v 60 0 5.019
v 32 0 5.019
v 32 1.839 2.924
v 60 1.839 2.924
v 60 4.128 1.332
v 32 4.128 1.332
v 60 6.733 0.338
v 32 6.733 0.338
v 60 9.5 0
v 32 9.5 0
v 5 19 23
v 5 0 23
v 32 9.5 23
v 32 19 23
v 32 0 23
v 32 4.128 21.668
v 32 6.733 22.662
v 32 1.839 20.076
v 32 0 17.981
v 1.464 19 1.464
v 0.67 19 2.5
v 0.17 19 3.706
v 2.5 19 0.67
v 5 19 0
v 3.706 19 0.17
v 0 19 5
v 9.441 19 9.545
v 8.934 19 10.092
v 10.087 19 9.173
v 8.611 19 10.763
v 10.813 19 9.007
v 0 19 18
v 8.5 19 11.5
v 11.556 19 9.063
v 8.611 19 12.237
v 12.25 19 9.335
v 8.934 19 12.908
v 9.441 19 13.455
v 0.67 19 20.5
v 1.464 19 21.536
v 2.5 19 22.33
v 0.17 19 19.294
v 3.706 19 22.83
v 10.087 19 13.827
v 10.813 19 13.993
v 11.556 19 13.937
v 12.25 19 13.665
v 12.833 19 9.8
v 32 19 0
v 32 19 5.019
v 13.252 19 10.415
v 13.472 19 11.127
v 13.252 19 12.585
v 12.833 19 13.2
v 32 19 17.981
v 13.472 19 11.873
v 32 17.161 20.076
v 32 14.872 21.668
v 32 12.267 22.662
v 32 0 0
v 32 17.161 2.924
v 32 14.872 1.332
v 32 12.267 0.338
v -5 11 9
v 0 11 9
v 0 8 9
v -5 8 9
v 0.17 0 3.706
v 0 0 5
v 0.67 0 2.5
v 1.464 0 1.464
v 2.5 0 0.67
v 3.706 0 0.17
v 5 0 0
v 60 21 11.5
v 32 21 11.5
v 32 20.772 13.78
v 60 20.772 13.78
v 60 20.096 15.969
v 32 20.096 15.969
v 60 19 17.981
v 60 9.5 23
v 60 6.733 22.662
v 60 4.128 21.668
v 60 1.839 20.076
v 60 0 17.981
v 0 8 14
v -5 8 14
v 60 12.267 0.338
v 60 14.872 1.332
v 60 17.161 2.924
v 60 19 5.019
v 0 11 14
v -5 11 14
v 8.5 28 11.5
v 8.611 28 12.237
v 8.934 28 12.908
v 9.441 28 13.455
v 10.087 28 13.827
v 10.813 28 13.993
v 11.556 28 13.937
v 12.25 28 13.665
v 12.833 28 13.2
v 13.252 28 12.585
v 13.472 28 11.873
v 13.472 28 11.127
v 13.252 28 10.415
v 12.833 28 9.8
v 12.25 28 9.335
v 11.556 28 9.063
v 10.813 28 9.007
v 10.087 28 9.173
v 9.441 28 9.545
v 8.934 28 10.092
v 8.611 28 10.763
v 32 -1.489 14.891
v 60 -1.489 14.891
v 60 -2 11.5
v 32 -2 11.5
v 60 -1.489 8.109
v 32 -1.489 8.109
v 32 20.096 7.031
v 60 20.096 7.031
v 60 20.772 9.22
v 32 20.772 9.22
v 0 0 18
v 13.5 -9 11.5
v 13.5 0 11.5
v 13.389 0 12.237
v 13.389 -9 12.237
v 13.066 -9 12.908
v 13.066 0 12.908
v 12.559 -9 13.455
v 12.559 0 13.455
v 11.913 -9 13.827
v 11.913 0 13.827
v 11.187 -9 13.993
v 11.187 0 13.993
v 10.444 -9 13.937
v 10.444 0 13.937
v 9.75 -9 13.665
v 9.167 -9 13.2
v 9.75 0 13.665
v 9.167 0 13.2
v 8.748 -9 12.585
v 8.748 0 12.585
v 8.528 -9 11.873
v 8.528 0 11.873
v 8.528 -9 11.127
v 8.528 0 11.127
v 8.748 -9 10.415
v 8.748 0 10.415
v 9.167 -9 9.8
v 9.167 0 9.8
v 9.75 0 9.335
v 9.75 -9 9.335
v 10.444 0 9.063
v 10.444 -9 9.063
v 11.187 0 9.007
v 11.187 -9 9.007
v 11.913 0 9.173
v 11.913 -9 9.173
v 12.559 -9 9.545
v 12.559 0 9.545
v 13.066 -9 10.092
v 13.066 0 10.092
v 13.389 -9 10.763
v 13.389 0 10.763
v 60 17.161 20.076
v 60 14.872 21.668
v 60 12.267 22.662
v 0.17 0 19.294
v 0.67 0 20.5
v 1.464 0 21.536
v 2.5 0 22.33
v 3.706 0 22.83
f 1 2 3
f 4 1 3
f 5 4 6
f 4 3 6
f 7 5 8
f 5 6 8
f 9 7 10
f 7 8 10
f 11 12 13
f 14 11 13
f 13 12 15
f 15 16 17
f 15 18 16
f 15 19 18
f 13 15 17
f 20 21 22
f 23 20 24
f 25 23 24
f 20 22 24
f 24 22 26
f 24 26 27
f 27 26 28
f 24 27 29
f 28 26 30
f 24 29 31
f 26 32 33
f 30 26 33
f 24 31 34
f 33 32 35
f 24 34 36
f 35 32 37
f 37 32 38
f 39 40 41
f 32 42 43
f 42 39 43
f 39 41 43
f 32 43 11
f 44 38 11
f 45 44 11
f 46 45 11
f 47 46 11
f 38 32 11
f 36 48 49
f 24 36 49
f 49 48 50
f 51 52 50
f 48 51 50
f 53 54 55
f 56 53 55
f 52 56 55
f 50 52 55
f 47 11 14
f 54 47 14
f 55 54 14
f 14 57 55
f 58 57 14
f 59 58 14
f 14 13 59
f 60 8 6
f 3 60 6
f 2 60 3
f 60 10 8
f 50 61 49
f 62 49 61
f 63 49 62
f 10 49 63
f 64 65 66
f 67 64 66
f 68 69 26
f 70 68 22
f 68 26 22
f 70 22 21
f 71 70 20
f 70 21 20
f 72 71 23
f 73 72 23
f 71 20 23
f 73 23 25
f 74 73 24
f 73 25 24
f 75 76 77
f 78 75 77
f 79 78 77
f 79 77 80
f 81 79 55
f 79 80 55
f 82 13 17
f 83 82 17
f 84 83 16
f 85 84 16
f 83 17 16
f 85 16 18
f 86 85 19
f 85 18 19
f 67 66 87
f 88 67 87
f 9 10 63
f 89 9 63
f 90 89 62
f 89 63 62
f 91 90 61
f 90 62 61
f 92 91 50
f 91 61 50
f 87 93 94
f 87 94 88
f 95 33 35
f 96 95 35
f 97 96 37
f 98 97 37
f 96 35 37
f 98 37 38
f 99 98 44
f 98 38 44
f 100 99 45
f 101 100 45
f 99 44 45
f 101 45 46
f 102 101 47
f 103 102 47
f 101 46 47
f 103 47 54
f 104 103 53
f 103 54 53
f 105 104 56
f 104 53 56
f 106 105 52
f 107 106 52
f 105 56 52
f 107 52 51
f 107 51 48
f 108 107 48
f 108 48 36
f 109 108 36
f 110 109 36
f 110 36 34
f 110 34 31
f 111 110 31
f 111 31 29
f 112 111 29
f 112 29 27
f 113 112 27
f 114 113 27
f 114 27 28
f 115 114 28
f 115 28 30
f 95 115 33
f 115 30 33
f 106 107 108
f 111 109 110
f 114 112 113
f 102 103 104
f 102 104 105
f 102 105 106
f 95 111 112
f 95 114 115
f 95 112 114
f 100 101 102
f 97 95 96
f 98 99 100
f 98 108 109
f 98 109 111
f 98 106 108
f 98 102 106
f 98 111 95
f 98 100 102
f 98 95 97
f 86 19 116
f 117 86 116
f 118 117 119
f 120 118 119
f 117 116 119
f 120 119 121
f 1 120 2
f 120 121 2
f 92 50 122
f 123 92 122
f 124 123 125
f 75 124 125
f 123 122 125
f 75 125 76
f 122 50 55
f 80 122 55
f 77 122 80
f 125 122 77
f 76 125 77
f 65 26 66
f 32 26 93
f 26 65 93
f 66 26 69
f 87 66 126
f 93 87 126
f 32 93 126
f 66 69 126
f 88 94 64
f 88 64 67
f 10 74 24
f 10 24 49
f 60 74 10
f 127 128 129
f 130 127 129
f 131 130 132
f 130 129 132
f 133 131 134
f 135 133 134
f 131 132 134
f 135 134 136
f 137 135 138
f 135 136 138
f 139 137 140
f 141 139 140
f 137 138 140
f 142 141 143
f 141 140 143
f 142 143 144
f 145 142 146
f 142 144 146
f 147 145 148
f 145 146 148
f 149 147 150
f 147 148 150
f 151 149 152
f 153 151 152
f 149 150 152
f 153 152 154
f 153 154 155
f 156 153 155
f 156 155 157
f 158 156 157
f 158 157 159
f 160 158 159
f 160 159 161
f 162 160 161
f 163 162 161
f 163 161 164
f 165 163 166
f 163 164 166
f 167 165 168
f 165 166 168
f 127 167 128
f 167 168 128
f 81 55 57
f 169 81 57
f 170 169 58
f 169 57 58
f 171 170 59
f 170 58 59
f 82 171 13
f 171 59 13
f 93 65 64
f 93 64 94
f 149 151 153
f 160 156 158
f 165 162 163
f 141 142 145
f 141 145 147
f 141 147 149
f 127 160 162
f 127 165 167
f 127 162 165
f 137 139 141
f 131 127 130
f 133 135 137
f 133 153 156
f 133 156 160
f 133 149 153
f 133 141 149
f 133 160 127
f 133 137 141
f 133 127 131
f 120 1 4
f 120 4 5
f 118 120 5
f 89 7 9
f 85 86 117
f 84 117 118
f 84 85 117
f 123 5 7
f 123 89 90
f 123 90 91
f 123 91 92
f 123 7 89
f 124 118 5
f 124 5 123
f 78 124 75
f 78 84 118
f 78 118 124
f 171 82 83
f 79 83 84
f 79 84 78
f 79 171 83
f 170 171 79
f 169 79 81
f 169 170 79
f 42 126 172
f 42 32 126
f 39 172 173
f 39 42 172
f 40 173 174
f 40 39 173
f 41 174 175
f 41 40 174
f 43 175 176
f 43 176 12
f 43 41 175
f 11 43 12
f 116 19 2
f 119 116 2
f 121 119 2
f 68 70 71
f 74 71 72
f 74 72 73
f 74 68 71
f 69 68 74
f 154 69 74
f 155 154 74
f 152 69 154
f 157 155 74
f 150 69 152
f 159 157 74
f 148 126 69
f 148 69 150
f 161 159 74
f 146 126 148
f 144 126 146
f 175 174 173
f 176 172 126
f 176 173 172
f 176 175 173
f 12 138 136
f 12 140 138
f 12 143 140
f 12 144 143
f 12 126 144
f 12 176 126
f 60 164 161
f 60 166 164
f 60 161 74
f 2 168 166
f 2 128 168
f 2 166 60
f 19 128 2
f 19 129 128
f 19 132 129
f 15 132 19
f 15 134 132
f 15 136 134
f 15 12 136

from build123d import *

# Parameters (mm, degrees)
F0_W      = 32
F0_H      = 23
F1_DEPTH  = 19
F2_R      = 5
F3_R      = 5
F4_W      = 3
F4_H      = 5
F5_DEPTH  = 5
F7_DEPTH  = 28
F8_R      = 2.5
F9_DEPTH  = 9
F10_R     = 2.5
F11_DEPTH = 9


with BuildPart() as f1:
    # F0 (on Front) → F1 (new body)
    with BuildSketch(Plane.XZ):
        with Locations((16, 11.5)):
            Rectangle(F0_W, F0_H)
    extrude(amount=-F1_DEPTH)

    # F2
    f2_edges = [f1.edges().sort_by_distance(p)[0] for p in [
        (0, 9.5, 23),
    ]]
    fillet(f2_edges, radius=F2_R)

    # F3
    f3_edges = [f1.edges().sort_by_distance(p)[0] for p in [
        (0, 9.5, 0),
    ]]
    fillet(f3_edges, radius=F3_R)

    # F4 (on face) → F5 (join)
    with BuildSketch(Plane(origin=(0, 0, 0), x_dir=(0, -1, 0), z_dir=(-1, 0, 0))):
        with Locations((-9.5, 11.5)):
            Rectangle(F4_W, F4_H)
    extrude(amount=F5_DEPTH)

    # F6 (on face) → F7 (join)
    with BuildSketch(Plane.YZ.offset(32)):
        with BuildLine():
            Line((19, 5.019259), (19, 17.980741))
            ThreePointArc((19, 17.980741), (14.872219, 21.668051), (9.5, 23))
            ThreePointArc((9.5, 23), (4.127781, 21.668051), (0, 17.980741))
            Line((0, 17.980741), (0, 5.019259))
            ThreePointArc((0, 5.019259), (4.127781, 1.331949), (9.5, 0))
            ThreePointArc((9.5, 0), (14.872219, 1.331949), (19, 5.019259))
        make_face()
        with BuildLine():
            ThreePointArc((19, 5.019259), (20.48863, 8.108835), (21, 11.5))
            ThreePointArc((21, 11.5), (20.48863, 14.891165), (19, 17.980741))
            Line((19, 17.980741), (19, 5.019259))
        make_face()
        with BuildLine():
            Line((0, 5.019259), (0, 17.980741))
            ThreePointArc((0, 17.980741), (-2, 11.5), (0, 5.019259))
        make_face()
    extrude(amount=F7_DEPTH)

    # F8 (on face) → F9 (join)
    with BuildSketch(Plane.XZ):
        with Locations((11, 11.5)):
            Circle(F8_R)
    extrude(amount=F9_DEPTH)

    # F10 (on face) → F11 (join)
    with BuildSketch(Plane(origin=(0, 19, 0), x_dir=(-1, 0, 0), z_dir=(0, 1, 0))):
        with Locations((-11, 11.5)):
            Circle(F10_R)
    extrude(amount=F11_DEPTH)


solid = f1.part
